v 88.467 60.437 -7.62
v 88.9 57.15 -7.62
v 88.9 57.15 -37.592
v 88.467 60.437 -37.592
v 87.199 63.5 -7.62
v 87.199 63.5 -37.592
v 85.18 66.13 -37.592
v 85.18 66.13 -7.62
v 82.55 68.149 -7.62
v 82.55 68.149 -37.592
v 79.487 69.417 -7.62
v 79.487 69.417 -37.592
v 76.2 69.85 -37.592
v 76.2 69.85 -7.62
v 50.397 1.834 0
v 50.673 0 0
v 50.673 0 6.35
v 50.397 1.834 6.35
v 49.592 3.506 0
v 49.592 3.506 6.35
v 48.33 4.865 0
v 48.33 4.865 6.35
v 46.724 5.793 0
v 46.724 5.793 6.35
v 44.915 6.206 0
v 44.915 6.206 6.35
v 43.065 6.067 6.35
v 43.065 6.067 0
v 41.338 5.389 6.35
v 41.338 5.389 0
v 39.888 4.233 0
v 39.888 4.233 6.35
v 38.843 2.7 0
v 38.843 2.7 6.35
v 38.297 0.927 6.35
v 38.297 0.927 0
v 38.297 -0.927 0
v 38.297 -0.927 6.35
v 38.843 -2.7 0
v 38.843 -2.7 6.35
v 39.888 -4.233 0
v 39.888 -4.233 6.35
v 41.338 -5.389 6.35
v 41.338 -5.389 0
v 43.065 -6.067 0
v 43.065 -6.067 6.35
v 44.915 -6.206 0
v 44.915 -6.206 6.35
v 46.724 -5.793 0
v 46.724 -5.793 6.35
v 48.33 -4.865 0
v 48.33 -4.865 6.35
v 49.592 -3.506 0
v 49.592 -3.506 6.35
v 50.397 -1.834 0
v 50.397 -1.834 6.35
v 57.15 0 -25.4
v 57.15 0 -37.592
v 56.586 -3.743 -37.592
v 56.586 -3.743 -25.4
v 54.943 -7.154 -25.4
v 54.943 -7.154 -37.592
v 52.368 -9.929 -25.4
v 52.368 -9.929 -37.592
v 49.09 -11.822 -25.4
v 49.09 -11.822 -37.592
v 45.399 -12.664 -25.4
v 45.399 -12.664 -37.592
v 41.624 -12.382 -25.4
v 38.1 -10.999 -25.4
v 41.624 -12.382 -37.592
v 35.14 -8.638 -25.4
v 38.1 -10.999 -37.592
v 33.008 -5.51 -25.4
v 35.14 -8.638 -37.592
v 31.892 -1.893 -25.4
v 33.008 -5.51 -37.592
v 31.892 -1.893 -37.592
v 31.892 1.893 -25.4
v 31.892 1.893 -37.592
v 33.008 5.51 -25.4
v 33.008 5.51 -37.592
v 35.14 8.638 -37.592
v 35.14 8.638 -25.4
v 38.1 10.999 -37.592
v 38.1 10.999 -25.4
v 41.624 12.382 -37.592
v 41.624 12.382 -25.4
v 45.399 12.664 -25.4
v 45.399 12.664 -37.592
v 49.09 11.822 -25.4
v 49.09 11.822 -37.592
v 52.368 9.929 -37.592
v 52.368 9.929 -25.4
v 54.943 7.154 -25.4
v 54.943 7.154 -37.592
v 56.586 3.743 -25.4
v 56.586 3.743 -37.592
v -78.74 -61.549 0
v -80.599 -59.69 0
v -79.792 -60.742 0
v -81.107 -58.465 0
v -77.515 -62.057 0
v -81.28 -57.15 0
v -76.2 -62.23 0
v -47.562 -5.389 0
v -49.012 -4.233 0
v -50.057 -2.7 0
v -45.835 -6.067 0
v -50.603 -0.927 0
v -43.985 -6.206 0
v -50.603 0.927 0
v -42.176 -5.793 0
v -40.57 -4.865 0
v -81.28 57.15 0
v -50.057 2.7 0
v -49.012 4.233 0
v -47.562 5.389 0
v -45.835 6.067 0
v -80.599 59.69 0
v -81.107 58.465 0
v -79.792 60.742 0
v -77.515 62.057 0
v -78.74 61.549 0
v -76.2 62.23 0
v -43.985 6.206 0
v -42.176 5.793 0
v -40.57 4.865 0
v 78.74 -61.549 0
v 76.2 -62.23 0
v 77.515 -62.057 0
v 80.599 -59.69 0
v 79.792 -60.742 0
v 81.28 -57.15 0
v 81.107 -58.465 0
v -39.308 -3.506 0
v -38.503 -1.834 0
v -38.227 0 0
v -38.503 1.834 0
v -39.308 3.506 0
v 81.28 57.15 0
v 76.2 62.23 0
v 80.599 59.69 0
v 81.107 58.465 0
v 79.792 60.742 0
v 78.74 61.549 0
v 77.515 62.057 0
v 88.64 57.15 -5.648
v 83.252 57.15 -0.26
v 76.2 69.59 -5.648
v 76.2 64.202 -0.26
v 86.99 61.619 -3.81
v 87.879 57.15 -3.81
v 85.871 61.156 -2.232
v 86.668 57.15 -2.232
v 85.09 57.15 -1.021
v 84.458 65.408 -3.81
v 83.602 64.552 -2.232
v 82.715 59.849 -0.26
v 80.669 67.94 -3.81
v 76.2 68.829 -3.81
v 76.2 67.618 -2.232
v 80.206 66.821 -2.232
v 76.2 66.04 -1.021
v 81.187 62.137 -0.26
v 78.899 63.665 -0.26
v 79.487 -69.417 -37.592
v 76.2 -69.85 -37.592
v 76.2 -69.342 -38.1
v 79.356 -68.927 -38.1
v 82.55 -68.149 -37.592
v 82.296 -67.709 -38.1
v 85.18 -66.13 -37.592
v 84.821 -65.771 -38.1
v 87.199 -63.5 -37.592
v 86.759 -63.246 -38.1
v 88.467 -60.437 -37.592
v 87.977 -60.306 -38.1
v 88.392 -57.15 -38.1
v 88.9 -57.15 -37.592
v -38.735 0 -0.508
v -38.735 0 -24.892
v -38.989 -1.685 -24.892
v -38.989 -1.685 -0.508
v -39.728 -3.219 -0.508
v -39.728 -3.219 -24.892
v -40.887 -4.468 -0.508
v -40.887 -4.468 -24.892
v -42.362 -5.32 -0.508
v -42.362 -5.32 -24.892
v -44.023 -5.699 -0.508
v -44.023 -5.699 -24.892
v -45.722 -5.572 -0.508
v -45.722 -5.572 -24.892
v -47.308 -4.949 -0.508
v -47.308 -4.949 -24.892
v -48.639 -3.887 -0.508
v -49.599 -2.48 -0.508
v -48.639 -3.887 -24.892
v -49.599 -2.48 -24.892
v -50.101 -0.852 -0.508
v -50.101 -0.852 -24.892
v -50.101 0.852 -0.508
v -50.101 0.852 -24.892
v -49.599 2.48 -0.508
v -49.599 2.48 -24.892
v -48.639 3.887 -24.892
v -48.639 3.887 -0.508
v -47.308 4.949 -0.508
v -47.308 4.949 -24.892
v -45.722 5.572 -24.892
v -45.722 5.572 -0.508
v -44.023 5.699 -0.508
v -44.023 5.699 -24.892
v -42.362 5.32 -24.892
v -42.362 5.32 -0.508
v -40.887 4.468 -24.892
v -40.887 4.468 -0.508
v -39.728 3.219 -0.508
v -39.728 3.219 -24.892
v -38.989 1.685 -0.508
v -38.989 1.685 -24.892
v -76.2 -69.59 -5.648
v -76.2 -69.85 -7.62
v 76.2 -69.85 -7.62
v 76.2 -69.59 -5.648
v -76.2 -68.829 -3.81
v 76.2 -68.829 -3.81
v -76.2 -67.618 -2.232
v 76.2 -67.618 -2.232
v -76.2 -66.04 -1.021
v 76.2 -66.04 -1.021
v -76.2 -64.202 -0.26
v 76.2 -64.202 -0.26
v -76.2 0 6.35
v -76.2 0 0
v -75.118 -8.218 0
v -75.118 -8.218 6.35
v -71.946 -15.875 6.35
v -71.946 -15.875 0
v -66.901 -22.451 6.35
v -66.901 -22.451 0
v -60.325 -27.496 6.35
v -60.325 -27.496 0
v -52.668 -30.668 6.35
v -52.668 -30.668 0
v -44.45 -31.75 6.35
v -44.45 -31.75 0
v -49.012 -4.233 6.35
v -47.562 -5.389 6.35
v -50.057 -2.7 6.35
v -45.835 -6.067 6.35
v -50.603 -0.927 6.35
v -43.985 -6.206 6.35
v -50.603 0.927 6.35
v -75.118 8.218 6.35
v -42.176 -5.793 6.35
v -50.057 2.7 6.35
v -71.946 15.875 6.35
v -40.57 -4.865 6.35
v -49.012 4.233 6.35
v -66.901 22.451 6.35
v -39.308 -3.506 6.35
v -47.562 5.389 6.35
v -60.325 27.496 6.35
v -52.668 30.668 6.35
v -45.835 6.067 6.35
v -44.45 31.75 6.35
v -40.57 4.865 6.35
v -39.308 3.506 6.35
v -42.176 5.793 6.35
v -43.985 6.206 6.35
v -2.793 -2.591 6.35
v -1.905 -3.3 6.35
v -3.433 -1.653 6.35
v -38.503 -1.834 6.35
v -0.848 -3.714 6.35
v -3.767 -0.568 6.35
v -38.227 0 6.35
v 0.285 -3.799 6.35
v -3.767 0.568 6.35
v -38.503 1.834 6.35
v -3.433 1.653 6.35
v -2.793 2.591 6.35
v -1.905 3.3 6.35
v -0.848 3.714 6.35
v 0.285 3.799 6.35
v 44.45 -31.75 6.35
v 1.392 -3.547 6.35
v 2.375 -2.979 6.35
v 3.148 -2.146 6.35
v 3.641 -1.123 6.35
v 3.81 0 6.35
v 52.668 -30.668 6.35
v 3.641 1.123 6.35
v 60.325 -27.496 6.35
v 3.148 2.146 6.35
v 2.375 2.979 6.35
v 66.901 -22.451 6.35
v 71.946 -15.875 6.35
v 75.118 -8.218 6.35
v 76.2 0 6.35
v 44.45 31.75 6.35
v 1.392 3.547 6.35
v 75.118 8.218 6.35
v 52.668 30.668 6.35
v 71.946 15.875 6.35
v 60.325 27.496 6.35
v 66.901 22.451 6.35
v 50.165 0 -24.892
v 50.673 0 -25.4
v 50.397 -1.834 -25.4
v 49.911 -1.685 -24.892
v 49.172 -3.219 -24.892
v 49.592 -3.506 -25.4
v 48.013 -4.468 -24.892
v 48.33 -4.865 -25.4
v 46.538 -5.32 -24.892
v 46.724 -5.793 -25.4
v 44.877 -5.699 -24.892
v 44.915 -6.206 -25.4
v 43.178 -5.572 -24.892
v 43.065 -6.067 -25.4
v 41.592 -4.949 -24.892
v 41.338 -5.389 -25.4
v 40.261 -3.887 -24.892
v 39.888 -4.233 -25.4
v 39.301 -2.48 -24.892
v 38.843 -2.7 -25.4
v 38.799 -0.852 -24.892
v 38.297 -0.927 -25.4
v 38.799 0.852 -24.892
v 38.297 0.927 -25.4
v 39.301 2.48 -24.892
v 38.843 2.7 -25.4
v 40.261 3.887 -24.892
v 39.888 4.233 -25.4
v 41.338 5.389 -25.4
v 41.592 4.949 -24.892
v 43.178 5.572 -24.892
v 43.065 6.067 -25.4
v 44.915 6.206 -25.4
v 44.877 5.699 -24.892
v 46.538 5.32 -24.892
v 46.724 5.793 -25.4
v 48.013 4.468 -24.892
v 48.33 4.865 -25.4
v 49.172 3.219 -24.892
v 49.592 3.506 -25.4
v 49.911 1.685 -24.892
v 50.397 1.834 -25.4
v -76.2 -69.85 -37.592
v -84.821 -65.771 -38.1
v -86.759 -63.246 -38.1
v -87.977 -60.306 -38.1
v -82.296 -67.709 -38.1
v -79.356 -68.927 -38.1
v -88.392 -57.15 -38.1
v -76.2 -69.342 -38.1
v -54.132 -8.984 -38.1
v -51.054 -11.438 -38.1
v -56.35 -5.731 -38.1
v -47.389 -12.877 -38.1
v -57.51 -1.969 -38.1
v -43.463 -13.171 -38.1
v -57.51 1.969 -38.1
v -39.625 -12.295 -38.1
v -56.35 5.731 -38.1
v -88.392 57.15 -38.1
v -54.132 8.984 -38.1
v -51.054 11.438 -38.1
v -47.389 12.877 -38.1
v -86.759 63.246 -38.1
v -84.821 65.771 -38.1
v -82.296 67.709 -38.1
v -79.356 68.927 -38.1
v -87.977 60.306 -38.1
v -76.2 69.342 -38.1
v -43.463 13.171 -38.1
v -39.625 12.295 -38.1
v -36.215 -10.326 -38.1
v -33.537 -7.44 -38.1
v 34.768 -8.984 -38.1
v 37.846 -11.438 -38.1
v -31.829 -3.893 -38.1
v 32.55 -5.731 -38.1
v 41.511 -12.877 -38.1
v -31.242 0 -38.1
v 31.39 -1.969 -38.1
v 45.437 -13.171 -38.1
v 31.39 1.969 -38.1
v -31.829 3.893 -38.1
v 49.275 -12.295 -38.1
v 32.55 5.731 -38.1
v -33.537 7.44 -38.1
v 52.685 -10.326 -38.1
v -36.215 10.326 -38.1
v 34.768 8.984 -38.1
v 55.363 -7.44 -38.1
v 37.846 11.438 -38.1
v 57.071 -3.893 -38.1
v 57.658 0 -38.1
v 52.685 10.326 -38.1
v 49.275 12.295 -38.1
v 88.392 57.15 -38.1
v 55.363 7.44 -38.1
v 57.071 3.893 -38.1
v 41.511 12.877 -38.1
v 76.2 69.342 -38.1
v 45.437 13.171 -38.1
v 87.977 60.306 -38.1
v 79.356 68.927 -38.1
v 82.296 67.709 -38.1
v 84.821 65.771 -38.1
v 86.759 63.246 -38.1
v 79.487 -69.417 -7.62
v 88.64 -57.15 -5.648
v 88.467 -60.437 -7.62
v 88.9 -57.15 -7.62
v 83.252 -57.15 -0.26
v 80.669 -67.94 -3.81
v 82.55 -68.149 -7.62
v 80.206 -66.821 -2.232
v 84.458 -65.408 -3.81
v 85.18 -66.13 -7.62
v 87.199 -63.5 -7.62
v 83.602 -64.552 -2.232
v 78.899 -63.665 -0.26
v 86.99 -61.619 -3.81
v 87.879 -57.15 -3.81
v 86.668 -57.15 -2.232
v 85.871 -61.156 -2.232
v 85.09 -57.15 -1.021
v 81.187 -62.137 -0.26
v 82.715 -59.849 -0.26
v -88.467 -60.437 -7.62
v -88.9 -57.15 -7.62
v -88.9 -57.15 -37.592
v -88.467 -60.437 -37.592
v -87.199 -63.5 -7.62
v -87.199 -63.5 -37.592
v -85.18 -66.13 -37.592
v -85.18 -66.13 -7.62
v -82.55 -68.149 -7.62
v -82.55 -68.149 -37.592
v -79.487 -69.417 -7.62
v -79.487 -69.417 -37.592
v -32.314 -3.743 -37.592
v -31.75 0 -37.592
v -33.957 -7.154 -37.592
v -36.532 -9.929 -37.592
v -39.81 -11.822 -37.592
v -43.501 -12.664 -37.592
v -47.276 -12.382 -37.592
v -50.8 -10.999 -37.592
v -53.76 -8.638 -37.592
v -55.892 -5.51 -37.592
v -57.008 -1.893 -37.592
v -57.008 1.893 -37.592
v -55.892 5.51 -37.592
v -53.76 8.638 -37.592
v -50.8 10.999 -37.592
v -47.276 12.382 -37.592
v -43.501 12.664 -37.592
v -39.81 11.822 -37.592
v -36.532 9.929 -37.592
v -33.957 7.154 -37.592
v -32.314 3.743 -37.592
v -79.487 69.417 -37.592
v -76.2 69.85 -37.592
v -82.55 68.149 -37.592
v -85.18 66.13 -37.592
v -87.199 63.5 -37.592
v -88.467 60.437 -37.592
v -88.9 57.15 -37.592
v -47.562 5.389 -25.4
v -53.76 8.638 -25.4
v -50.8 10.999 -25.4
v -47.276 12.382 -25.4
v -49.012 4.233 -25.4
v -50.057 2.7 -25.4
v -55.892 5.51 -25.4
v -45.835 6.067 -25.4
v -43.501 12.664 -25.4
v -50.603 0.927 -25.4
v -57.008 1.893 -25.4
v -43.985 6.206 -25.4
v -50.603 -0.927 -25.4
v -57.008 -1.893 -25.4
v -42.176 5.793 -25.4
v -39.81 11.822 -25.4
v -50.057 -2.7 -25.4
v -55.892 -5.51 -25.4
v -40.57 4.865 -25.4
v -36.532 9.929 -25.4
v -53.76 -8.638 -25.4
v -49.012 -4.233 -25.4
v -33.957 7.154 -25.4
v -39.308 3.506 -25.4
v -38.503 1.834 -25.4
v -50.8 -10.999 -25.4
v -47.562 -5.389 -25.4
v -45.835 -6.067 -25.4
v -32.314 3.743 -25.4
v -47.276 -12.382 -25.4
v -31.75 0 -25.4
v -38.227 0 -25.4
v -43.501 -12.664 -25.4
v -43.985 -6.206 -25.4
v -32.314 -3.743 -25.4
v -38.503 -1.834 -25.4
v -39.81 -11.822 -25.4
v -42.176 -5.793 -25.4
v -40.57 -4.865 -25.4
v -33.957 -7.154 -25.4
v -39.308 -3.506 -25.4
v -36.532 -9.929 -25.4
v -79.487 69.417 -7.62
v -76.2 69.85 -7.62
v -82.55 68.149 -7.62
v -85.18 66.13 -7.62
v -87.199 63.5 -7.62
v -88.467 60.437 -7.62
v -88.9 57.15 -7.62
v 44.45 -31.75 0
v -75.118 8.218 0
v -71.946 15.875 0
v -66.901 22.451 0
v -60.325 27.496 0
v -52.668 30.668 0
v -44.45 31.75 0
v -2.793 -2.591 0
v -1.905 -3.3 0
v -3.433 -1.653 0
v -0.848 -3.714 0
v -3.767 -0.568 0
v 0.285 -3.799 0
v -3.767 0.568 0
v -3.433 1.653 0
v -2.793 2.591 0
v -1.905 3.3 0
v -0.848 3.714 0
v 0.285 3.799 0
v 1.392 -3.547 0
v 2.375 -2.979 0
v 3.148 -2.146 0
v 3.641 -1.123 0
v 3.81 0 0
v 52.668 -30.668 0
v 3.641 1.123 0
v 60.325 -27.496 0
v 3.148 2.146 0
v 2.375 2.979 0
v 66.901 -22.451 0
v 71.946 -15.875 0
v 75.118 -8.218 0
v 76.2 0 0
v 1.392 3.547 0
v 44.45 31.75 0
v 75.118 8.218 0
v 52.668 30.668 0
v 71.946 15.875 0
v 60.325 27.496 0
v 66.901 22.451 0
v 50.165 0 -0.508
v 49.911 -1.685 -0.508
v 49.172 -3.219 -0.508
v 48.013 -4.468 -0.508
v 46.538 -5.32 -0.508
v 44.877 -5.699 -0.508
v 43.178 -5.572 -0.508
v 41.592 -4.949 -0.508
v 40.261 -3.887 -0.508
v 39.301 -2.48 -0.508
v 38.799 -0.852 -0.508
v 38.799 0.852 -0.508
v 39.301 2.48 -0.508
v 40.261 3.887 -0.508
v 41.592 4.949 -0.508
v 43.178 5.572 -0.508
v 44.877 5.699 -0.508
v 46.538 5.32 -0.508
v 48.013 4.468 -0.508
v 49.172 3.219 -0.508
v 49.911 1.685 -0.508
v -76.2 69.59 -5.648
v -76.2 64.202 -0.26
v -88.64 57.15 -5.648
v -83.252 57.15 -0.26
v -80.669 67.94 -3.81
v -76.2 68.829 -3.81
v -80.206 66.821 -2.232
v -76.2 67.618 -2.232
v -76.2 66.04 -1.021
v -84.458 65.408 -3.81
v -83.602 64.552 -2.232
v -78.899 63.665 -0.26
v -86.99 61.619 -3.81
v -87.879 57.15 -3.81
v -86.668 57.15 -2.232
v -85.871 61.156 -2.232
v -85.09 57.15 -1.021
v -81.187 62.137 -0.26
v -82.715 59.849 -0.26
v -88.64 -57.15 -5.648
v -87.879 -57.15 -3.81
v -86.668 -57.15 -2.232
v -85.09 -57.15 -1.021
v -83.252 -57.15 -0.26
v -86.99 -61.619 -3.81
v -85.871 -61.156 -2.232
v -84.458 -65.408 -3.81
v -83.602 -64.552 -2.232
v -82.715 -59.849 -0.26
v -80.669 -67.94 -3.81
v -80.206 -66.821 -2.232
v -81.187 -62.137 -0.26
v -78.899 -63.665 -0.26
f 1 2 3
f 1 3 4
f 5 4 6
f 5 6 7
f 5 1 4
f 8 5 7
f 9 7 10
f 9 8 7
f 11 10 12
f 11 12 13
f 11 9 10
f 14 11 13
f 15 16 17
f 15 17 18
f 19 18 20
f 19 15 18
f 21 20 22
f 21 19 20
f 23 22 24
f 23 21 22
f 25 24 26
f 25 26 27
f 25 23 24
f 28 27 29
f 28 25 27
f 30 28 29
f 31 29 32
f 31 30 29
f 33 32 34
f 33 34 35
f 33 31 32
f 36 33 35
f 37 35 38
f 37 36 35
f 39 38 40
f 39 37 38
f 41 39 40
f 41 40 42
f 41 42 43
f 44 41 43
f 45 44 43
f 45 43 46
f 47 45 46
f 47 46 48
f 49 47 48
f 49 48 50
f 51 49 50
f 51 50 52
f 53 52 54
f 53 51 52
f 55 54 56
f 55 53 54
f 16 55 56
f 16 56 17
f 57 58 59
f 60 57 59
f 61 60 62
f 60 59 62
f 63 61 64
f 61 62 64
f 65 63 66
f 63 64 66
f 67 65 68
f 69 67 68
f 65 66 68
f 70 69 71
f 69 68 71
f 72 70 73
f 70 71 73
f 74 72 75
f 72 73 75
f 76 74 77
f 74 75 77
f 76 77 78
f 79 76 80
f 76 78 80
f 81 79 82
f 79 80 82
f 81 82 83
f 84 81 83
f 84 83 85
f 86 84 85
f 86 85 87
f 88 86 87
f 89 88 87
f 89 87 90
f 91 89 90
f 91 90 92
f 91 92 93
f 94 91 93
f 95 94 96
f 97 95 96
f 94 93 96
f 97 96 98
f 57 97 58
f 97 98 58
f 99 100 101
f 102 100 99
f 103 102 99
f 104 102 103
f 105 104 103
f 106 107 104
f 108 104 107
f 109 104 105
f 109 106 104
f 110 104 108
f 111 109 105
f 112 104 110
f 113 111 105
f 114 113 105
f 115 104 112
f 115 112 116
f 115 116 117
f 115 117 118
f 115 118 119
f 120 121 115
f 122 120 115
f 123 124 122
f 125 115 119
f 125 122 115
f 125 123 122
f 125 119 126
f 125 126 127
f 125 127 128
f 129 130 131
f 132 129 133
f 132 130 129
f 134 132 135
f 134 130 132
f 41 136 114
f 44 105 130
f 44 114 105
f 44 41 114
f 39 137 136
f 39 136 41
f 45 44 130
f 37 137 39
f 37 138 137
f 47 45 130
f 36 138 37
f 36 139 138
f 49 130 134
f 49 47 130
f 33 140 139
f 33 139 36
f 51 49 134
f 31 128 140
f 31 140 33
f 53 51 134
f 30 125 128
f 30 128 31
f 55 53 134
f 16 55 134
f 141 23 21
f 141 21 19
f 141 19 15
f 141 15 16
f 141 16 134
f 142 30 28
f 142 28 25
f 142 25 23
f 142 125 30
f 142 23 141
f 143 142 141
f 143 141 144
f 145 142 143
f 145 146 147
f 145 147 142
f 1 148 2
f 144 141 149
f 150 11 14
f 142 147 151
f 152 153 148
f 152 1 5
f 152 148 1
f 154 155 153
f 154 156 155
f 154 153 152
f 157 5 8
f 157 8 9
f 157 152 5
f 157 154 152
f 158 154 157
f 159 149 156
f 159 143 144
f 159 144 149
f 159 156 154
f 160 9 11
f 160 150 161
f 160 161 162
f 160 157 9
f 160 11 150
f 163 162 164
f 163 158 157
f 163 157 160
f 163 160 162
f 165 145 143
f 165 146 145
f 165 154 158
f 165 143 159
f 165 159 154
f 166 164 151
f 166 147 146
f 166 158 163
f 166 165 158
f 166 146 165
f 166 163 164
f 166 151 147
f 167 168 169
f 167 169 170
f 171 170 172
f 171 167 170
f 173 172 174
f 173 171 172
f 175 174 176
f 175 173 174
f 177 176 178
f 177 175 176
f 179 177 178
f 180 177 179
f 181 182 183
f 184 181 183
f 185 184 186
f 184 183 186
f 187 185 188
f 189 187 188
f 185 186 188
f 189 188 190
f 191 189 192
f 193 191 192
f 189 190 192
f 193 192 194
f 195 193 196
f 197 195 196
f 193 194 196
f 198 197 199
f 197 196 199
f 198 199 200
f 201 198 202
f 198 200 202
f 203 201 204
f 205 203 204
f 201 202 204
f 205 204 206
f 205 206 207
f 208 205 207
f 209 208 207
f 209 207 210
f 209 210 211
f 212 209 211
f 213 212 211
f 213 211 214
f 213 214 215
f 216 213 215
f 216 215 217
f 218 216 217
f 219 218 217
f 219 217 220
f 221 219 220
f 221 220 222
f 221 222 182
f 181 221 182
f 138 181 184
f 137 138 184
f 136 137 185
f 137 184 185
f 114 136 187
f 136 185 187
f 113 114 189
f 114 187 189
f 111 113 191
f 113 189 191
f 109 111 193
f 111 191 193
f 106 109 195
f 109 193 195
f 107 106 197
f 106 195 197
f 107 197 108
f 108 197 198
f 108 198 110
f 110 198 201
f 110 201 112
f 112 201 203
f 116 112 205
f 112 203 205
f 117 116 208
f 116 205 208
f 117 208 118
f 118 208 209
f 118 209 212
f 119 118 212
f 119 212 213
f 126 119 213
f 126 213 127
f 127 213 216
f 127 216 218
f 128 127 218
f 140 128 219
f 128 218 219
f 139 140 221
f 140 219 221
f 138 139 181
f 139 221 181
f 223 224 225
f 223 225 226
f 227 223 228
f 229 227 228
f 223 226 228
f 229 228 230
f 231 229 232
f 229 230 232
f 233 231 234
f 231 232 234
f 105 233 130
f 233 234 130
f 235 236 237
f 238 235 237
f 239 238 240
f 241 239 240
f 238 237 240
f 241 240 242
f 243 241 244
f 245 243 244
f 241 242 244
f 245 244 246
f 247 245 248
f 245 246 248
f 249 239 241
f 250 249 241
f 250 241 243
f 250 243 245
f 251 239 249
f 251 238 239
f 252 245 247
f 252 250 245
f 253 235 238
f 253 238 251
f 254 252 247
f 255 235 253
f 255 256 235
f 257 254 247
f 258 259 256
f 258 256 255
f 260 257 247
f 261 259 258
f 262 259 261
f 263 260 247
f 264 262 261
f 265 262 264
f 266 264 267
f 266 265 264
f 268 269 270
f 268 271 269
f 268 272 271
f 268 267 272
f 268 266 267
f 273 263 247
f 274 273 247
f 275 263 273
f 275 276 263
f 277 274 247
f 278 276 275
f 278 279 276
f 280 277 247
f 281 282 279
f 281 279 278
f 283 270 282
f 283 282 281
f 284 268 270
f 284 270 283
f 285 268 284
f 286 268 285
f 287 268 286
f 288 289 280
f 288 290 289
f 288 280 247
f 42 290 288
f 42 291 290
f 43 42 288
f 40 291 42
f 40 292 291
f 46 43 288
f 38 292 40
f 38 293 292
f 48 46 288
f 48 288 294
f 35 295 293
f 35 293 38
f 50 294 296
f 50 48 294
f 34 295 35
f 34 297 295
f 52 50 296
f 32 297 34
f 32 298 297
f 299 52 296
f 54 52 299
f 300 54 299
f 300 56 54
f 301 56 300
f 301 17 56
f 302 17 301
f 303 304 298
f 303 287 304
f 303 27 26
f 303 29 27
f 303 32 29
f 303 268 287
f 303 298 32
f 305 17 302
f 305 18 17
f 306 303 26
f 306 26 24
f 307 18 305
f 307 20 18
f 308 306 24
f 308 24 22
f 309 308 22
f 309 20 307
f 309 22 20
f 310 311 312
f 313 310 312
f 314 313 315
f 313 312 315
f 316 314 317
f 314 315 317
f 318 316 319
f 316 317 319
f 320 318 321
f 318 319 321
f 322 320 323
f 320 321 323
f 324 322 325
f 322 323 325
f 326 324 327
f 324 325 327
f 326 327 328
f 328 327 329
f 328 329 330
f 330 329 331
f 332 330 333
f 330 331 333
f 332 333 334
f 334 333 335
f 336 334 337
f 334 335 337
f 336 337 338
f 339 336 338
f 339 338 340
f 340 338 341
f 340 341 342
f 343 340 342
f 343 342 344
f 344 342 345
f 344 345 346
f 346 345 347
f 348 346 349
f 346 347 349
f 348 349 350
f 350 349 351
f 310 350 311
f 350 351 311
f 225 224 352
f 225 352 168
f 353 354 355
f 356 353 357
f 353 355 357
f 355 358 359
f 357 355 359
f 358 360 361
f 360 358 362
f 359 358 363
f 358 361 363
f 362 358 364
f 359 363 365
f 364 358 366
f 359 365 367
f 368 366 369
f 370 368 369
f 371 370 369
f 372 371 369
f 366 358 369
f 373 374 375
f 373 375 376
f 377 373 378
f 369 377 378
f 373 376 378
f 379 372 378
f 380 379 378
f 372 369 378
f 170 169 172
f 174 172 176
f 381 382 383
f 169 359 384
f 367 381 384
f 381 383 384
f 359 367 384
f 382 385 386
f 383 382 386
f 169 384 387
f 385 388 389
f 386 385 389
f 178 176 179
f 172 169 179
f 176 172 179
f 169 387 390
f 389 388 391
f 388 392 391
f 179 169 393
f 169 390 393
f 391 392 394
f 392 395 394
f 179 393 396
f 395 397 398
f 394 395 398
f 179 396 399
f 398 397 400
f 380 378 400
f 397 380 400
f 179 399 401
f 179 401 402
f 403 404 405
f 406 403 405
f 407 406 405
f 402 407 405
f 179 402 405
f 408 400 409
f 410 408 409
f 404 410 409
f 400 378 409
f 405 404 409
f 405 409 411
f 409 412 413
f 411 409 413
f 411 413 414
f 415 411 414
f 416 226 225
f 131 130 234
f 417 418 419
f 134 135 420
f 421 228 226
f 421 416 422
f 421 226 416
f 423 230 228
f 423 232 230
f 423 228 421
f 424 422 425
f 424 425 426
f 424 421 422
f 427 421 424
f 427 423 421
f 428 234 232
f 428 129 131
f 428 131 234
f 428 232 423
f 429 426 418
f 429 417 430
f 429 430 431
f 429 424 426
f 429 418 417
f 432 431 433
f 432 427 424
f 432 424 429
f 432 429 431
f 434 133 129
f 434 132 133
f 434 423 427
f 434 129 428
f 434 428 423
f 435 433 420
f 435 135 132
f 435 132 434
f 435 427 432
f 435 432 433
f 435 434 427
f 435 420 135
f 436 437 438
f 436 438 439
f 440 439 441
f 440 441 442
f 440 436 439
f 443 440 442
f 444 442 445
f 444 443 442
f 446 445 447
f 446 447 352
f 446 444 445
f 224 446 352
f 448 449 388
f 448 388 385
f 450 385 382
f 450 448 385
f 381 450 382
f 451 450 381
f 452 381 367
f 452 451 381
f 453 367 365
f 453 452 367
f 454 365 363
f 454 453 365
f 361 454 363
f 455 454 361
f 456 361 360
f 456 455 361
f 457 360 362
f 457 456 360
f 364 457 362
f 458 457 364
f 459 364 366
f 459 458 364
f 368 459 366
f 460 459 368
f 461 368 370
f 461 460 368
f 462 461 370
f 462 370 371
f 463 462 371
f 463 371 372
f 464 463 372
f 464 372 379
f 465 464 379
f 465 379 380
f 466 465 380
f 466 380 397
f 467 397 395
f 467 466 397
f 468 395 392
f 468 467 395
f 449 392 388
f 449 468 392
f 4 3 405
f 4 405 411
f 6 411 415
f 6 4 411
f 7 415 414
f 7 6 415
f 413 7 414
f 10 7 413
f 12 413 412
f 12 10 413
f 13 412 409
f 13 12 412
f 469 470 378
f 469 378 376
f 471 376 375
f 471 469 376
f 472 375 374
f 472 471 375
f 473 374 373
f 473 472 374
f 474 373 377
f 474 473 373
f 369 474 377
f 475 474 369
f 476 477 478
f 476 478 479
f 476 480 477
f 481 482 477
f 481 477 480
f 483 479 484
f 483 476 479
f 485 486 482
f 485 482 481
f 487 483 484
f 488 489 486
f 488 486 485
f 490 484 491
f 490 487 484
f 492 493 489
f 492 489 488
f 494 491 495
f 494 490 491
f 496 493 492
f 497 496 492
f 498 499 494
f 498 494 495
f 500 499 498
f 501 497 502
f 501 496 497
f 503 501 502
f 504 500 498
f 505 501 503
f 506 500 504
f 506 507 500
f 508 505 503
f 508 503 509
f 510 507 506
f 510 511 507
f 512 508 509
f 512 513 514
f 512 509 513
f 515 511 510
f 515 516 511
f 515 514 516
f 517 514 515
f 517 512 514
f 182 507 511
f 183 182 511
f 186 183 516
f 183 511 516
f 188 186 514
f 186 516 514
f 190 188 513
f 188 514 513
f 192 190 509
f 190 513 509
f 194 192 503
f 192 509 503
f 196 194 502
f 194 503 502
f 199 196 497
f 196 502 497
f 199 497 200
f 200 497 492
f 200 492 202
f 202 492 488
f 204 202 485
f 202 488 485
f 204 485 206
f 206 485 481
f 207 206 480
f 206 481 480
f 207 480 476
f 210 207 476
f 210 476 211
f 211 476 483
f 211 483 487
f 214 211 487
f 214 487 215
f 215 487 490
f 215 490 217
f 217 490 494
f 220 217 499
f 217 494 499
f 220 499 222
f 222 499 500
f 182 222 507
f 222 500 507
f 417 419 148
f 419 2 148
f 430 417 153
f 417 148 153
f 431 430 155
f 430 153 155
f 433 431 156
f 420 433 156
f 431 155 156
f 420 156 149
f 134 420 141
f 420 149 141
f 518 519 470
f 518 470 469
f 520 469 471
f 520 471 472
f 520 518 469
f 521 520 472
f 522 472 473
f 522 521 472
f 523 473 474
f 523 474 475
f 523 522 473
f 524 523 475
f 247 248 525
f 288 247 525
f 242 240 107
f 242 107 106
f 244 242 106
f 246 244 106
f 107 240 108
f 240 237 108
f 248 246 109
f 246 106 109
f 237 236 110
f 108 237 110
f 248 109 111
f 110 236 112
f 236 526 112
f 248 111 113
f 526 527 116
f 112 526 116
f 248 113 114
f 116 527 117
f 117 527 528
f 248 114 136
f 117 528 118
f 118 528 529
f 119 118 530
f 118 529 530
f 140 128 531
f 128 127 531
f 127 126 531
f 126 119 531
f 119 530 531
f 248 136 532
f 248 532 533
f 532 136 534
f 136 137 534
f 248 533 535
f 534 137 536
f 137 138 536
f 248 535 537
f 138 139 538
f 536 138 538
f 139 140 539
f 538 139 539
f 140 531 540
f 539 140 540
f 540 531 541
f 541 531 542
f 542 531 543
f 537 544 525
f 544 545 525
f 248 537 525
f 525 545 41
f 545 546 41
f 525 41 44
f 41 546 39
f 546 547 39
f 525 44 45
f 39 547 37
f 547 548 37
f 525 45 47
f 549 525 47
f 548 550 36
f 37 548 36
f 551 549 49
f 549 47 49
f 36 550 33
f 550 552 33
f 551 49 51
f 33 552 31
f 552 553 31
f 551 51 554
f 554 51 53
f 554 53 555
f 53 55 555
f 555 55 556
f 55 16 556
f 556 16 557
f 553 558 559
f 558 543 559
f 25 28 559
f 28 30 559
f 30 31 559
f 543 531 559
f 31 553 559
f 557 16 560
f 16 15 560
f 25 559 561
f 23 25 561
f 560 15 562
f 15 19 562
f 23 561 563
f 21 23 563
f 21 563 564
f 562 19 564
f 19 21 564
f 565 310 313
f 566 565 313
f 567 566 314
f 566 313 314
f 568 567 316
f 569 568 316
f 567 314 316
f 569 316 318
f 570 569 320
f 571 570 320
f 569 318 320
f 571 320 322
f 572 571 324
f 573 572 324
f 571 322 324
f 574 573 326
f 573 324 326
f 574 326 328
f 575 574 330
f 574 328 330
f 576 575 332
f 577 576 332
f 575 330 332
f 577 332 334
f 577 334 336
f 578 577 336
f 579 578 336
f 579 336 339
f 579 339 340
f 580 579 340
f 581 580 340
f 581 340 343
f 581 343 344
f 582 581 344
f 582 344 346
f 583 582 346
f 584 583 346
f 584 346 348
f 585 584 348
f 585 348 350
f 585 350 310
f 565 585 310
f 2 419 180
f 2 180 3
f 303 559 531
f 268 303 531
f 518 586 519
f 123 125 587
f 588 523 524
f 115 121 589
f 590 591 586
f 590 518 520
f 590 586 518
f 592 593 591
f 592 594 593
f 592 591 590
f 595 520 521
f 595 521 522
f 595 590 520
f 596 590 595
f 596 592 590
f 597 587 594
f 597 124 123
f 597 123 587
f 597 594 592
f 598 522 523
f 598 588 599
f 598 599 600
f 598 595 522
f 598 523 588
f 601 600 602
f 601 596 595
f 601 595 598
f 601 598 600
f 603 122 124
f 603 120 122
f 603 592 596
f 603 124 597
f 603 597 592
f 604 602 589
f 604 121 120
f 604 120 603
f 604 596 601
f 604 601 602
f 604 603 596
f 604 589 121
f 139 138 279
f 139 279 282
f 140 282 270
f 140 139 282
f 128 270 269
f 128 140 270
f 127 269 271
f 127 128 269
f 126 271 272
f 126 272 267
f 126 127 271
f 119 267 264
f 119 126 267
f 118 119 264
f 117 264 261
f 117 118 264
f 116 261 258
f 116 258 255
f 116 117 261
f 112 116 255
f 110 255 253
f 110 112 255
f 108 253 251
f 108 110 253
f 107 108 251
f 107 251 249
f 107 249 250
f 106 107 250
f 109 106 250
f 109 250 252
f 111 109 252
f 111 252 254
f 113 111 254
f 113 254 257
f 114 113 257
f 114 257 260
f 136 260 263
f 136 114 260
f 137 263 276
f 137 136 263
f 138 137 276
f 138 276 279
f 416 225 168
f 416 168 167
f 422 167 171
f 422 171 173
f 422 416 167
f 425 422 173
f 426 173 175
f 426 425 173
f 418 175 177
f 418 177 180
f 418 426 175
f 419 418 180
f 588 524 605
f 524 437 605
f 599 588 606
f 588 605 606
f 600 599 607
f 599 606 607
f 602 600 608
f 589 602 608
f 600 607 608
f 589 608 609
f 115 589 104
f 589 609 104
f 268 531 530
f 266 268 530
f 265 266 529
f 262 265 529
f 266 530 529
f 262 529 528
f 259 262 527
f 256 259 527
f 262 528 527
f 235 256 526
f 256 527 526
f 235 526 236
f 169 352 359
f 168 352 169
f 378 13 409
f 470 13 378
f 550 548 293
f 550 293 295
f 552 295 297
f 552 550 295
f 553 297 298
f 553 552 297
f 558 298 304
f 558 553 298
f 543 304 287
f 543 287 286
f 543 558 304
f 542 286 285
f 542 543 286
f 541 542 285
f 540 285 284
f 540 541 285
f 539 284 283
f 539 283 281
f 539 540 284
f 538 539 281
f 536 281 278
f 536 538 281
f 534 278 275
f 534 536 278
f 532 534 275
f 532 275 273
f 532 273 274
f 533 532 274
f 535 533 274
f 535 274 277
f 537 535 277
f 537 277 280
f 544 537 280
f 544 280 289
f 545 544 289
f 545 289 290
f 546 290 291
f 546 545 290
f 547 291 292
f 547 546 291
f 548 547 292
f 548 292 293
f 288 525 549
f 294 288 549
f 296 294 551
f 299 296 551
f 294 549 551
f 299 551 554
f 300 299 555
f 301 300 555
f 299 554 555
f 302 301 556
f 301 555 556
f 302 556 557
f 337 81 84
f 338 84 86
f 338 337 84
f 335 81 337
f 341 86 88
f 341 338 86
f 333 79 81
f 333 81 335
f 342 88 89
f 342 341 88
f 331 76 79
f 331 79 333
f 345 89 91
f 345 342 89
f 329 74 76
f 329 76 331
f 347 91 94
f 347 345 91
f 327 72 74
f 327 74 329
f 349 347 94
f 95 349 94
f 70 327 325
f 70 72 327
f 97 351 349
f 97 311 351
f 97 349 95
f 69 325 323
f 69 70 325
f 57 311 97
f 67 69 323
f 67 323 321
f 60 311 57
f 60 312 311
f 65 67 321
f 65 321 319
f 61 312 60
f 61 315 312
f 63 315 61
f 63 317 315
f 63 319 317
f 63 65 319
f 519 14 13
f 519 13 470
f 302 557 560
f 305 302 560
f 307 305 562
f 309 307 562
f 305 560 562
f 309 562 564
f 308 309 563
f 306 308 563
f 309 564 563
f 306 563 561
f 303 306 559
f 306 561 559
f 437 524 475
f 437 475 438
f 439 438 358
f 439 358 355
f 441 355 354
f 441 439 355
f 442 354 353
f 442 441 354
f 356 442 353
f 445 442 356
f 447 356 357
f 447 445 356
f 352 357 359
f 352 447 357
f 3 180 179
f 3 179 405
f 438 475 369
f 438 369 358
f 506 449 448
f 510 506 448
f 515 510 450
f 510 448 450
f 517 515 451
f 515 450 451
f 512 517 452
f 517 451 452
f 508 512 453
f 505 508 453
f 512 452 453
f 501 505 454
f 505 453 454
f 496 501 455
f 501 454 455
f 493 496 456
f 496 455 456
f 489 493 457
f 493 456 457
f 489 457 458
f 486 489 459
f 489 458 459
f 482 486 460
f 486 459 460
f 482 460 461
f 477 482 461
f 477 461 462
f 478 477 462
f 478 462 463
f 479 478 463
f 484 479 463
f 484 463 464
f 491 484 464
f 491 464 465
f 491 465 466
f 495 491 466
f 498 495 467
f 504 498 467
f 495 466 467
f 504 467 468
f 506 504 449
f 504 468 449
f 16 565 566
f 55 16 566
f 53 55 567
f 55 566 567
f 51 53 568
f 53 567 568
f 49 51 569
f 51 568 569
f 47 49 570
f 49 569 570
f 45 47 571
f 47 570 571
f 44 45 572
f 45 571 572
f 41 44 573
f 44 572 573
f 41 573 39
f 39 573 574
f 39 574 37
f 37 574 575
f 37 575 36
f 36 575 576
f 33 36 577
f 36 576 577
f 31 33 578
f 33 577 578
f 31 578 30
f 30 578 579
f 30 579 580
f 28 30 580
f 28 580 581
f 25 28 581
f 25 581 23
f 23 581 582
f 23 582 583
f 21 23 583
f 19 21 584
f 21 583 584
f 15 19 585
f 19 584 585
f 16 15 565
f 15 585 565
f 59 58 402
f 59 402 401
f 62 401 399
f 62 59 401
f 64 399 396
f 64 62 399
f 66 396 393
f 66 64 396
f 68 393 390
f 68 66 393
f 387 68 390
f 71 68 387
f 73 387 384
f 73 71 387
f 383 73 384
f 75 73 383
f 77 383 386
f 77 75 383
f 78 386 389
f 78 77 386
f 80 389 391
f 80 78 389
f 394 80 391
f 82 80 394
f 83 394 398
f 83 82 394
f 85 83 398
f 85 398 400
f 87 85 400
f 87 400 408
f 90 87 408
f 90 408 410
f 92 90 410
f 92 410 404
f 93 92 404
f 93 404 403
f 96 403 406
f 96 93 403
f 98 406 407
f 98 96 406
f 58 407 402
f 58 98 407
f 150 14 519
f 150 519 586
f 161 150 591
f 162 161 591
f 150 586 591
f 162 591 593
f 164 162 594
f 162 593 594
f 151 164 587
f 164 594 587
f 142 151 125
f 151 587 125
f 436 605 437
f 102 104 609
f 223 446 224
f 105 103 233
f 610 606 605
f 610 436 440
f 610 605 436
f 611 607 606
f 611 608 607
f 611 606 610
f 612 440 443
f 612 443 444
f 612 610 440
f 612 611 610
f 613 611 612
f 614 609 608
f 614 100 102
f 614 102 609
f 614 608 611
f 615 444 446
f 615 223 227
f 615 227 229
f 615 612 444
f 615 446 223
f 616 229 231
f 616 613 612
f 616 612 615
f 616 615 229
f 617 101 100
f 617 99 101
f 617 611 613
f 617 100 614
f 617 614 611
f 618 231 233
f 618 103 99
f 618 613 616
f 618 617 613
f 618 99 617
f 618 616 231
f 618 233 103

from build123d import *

# Parameters (mm, degrees)
F1_DEPTH = 38.1
F2_R     = 7.62
F3_R     = 12.7
F3_R_2   = 5.715
F4_DEPTH = 12.7
F5_DEPTH = 38.101
F6_SIZE  = 0.508
F7_R     = 6.223
F7_R_2   = 3.81
F8_DEPTH = 6.35


with BuildPart() as f1:
    # F0 (on Top) → F1 (new body)
    with BuildSketch(Plane.XY):
        with BuildLine():
            Line((76.2, 69.85), (-76.2, 69.85))
            ThreePointArc((-76.2, 69.85), (-85.180256, 66.130256), (-88.9, 57.15))
            Line((-88.9, 57.15), (-88.9, -57.15))
            ThreePointArc((-88.9, -57.15), (-85.180256, -66.130256), (-76.2, -69.85))
            Line((-76.2, -69.85), (76.2, -69.85))
            ThreePointArc((76.2, -69.85), (85.180256, -66.130256), (88.9, -57.15))
            Line((88.9, -57.15), (88.9, 57.15))
            ThreePointArc((88.9, 57.15), (85.180256, 66.130256), (76.2, 69.85))
        make_face()
    extrude(amount=-F1_DEPTH)

    # F2
    f2_edges = [f1.edges().sort_by_distance(p)[0] for p in [
        (0, -69.85, 0),
    ]]
    fillet(f2_edges, radius=F2_R)

    # F3 (on face) → F4 (cut)
    with BuildSketch(Plane(origin=(0, 0, -38.1), x_dir=(1, 0, 0), z_dir=(0, 0, -1))):
        with Locations((-44.45, 0)):
            Circle(F3_R)
        with Locations((-44.45, 0)):
            Circle(F3_R_2, mode=Mode.SUBTRACT)
        with Locations((-44.45, 0)):
            Circle(F3_R_2)
        with Locations((44.45, 0)):
            Circle(F3_R)
        with Locations((44.45, 0)):
            Circle(F3_R_2, mode=Mode.SUBTRACT)
        with Locations((44.45, 0)):
            Circle(F3_R_2)
    extrude(amount=-F4_DEPTH, mode=Mode.SUBTRACT)

    # F3 (on face) → F5 (cut, through all)
    with BuildSketch(Plane(origin=(0, 0, -38.1), x_dir=(1, 0, 0), z_dir=(0, 0, -1))):
        with Locations((-44.45, 0)):
            Circle(F3_R_2)
        with Locations((44.45, 0)):
            Circle(F3_R_2)
    extrude(amount=-F5_DEPTH, mode=Mode.SUBTRACT)

    # F6
    f6_edges = [f1.edges().sort_by_distance(p)[0] for p in [
        (0, -69.85, -38.1),
        (-57.15, 0, -38.1),
        (31.75, 0, -38.1),
        (38.735, 0, -25.4),
        (-50.165, 0, -25.4),
        (38.735, 0, 0),
        (-50.165, 0, 0),
    ]]
    chamfer(f6_edges, length=F6_SIZE)


with BuildPart() as f8:
    # F7 (on face) → F8 (new body)
    with BuildSketch(Plane.XY):
        with BuildLine():
            Line((44.45, 31.75), (-44.45, 31.75))
            ThreePointArc((-44.45, 31.75), (-66.90064, 22.45064), (-76.2, 0))
            ThreePointArc((-76.2, 0), (-66.90064, -22.45064), (-44.45, -31.75))
            Line((-44.45, -31.75), (44.45, -31.75))
            ThreePointArc((44.45, -31.75), (66.90064, -22.45064), (76.2, 0))
            ThreePointArc((76.2, 0), (66.90064, 22.45064), (44.45, 31.75))
        make_face()
        with Locations((-44.45, 0)):
            Circle(F7_R, mode=Mode.SUBTRACT)
        Circle(F7_R_2, mode=Mode.SUBTRACT)
        with Locations((44.45, 0)):
            Circle(F7_R, mode=Mode.SUBTRACT)
    extrude(amount=F8_DEPTH)


solid = Compound([f1.part, f8.part])
